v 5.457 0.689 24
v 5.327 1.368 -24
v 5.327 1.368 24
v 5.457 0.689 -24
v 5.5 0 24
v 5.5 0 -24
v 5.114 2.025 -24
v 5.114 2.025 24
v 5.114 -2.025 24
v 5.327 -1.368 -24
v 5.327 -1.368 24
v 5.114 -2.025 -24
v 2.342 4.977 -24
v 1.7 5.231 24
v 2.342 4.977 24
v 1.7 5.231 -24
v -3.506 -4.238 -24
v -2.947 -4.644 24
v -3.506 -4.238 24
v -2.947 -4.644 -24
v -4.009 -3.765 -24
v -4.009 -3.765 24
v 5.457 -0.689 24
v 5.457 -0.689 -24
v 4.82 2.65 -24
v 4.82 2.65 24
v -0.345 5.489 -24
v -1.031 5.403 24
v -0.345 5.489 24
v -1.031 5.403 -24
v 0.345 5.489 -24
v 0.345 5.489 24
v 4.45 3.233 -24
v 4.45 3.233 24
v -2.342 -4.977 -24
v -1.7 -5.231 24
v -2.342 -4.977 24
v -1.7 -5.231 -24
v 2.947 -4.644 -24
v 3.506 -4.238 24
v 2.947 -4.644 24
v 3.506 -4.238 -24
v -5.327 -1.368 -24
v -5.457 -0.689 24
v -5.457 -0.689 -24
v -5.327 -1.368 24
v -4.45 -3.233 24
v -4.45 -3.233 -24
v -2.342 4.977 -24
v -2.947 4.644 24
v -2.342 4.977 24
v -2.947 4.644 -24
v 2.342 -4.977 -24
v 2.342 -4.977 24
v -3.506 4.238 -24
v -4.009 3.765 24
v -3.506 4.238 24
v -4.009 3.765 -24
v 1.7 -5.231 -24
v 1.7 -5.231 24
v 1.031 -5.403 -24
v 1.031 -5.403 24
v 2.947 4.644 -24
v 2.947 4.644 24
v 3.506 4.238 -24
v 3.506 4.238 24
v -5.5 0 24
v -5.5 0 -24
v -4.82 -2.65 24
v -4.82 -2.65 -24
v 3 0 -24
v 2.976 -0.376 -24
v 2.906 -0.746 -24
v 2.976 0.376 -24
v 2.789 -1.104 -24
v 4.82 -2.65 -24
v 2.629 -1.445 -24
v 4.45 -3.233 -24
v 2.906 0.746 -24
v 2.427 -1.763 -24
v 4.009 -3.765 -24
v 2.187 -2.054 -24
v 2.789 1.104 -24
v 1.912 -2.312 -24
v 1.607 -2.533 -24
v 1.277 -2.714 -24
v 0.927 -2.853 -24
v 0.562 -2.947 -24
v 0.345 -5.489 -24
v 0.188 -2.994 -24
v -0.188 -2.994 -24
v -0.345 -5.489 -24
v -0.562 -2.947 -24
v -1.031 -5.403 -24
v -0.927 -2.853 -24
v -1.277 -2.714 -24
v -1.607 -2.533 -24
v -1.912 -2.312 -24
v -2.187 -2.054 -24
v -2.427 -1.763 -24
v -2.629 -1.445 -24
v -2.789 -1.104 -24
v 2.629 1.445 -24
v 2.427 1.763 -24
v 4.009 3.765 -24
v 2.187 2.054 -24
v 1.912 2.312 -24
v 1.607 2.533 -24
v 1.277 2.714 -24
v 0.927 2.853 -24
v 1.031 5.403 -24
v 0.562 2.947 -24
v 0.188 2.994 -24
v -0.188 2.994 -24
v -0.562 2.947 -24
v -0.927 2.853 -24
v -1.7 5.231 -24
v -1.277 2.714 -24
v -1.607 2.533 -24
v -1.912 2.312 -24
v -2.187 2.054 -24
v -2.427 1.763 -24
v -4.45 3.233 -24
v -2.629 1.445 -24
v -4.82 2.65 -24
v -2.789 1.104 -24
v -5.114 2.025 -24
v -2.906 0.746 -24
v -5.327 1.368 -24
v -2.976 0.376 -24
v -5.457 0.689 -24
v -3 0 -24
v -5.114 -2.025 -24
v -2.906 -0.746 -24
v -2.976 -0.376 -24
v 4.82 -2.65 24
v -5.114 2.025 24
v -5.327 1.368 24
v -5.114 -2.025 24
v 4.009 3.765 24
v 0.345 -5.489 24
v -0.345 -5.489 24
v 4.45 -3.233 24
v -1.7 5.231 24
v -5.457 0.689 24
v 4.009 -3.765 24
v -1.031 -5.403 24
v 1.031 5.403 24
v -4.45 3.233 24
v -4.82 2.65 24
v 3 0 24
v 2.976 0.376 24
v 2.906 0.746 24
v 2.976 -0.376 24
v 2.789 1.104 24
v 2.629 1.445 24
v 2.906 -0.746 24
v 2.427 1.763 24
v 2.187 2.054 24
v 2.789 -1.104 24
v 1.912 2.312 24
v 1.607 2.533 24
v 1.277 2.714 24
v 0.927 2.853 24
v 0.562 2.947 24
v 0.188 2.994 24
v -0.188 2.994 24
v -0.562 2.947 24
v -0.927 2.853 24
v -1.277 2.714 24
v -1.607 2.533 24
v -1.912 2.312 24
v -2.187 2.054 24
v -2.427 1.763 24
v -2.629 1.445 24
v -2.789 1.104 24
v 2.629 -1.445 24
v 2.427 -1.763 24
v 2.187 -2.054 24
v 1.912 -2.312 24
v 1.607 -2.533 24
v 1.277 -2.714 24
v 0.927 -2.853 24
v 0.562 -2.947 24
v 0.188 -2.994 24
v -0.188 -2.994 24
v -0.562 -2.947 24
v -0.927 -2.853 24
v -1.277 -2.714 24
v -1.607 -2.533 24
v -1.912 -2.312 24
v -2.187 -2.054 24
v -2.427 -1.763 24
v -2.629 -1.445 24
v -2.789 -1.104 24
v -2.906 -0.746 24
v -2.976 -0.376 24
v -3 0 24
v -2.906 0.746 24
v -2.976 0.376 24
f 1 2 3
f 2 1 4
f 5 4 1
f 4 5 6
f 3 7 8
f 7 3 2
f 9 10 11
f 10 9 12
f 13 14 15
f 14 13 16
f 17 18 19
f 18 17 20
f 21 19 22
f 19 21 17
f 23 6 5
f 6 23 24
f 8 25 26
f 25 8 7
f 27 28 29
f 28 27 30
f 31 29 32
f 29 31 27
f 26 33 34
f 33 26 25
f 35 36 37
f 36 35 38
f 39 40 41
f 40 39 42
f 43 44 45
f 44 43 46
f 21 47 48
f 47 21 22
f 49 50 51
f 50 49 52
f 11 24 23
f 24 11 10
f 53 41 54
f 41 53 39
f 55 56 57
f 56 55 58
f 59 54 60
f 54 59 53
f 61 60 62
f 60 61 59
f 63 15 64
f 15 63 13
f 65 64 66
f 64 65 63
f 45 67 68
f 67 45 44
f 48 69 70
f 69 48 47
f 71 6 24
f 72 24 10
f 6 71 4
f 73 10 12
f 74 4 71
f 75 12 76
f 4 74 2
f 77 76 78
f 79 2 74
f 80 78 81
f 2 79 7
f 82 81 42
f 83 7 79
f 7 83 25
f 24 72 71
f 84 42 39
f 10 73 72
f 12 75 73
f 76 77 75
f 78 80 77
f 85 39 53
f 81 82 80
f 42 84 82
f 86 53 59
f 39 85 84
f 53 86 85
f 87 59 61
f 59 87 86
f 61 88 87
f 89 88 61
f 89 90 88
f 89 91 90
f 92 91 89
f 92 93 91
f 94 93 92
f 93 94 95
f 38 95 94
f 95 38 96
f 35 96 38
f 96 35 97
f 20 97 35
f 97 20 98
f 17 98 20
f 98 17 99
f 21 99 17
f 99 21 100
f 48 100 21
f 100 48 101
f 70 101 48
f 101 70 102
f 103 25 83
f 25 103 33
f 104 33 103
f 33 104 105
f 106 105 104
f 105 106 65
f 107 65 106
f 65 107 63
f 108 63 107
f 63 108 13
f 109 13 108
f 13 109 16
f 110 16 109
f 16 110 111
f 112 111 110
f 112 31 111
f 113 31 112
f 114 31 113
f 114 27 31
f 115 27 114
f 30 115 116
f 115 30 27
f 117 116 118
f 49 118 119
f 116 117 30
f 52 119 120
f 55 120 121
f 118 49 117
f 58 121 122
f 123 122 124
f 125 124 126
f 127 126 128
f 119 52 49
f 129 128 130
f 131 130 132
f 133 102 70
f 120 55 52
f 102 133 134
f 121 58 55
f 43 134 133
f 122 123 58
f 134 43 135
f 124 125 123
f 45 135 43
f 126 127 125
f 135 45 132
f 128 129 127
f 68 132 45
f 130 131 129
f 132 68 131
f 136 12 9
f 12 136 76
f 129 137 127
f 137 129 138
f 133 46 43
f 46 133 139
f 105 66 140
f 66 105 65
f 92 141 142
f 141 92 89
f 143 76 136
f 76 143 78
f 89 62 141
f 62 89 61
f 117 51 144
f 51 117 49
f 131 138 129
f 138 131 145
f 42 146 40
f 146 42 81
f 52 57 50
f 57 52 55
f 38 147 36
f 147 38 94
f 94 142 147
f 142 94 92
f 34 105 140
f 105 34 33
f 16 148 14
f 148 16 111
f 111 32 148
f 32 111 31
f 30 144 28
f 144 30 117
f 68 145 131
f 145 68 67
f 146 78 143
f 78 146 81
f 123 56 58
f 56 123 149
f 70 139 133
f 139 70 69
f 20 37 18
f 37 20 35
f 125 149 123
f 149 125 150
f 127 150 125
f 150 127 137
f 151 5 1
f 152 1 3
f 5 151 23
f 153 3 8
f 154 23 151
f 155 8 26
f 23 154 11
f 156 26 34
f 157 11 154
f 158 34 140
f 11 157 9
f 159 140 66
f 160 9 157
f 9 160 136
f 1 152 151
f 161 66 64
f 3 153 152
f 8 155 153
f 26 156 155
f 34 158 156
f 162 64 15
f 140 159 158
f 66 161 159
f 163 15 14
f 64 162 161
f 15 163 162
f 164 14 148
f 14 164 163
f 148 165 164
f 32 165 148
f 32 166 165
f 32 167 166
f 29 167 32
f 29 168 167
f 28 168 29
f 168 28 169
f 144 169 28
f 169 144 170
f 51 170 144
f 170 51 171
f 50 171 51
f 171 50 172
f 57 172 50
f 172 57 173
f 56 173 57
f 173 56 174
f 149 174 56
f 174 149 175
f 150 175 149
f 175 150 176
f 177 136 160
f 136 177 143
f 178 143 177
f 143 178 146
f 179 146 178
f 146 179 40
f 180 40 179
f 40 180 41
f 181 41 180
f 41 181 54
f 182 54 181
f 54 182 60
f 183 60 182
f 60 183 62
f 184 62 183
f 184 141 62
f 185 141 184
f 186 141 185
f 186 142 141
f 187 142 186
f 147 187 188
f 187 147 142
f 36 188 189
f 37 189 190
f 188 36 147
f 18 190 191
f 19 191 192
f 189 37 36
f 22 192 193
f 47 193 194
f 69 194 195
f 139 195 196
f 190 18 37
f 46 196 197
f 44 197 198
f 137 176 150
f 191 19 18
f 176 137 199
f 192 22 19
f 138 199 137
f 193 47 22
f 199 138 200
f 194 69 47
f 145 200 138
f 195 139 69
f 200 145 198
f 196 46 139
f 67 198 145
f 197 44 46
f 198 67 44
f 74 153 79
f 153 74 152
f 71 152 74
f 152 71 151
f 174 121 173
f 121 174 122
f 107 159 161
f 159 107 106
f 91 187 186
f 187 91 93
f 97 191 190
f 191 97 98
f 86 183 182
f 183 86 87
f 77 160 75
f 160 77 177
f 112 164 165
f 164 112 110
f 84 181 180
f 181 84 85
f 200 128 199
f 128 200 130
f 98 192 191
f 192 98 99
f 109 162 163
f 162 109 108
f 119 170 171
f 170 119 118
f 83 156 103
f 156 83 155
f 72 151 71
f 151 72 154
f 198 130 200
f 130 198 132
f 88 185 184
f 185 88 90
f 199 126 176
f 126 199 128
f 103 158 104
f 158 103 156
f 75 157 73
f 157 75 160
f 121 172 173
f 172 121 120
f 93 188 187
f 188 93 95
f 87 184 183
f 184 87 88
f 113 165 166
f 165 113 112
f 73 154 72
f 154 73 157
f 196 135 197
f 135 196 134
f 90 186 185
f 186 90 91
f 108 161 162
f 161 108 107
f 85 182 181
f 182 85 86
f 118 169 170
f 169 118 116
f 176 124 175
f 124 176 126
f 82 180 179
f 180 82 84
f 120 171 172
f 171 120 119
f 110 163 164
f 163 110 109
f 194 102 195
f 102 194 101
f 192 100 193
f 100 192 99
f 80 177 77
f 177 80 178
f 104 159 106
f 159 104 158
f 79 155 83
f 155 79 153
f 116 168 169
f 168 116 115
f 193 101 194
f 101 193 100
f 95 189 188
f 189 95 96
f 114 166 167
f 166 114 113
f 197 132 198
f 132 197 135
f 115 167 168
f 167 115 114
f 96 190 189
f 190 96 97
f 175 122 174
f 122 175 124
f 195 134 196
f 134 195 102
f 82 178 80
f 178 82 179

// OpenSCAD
$fn = 50;


difference() {
	union() {
		translate(v = [0, 0, -24.0000000000]) {
			cylinder(h = 48, r = 5.5000000000);
		}
	}
	union() {
		translate(v = [0, 0, -100.0000000000]) {
			cylinder(h = 200, r = 3.0000000000);
		}
	}
}
